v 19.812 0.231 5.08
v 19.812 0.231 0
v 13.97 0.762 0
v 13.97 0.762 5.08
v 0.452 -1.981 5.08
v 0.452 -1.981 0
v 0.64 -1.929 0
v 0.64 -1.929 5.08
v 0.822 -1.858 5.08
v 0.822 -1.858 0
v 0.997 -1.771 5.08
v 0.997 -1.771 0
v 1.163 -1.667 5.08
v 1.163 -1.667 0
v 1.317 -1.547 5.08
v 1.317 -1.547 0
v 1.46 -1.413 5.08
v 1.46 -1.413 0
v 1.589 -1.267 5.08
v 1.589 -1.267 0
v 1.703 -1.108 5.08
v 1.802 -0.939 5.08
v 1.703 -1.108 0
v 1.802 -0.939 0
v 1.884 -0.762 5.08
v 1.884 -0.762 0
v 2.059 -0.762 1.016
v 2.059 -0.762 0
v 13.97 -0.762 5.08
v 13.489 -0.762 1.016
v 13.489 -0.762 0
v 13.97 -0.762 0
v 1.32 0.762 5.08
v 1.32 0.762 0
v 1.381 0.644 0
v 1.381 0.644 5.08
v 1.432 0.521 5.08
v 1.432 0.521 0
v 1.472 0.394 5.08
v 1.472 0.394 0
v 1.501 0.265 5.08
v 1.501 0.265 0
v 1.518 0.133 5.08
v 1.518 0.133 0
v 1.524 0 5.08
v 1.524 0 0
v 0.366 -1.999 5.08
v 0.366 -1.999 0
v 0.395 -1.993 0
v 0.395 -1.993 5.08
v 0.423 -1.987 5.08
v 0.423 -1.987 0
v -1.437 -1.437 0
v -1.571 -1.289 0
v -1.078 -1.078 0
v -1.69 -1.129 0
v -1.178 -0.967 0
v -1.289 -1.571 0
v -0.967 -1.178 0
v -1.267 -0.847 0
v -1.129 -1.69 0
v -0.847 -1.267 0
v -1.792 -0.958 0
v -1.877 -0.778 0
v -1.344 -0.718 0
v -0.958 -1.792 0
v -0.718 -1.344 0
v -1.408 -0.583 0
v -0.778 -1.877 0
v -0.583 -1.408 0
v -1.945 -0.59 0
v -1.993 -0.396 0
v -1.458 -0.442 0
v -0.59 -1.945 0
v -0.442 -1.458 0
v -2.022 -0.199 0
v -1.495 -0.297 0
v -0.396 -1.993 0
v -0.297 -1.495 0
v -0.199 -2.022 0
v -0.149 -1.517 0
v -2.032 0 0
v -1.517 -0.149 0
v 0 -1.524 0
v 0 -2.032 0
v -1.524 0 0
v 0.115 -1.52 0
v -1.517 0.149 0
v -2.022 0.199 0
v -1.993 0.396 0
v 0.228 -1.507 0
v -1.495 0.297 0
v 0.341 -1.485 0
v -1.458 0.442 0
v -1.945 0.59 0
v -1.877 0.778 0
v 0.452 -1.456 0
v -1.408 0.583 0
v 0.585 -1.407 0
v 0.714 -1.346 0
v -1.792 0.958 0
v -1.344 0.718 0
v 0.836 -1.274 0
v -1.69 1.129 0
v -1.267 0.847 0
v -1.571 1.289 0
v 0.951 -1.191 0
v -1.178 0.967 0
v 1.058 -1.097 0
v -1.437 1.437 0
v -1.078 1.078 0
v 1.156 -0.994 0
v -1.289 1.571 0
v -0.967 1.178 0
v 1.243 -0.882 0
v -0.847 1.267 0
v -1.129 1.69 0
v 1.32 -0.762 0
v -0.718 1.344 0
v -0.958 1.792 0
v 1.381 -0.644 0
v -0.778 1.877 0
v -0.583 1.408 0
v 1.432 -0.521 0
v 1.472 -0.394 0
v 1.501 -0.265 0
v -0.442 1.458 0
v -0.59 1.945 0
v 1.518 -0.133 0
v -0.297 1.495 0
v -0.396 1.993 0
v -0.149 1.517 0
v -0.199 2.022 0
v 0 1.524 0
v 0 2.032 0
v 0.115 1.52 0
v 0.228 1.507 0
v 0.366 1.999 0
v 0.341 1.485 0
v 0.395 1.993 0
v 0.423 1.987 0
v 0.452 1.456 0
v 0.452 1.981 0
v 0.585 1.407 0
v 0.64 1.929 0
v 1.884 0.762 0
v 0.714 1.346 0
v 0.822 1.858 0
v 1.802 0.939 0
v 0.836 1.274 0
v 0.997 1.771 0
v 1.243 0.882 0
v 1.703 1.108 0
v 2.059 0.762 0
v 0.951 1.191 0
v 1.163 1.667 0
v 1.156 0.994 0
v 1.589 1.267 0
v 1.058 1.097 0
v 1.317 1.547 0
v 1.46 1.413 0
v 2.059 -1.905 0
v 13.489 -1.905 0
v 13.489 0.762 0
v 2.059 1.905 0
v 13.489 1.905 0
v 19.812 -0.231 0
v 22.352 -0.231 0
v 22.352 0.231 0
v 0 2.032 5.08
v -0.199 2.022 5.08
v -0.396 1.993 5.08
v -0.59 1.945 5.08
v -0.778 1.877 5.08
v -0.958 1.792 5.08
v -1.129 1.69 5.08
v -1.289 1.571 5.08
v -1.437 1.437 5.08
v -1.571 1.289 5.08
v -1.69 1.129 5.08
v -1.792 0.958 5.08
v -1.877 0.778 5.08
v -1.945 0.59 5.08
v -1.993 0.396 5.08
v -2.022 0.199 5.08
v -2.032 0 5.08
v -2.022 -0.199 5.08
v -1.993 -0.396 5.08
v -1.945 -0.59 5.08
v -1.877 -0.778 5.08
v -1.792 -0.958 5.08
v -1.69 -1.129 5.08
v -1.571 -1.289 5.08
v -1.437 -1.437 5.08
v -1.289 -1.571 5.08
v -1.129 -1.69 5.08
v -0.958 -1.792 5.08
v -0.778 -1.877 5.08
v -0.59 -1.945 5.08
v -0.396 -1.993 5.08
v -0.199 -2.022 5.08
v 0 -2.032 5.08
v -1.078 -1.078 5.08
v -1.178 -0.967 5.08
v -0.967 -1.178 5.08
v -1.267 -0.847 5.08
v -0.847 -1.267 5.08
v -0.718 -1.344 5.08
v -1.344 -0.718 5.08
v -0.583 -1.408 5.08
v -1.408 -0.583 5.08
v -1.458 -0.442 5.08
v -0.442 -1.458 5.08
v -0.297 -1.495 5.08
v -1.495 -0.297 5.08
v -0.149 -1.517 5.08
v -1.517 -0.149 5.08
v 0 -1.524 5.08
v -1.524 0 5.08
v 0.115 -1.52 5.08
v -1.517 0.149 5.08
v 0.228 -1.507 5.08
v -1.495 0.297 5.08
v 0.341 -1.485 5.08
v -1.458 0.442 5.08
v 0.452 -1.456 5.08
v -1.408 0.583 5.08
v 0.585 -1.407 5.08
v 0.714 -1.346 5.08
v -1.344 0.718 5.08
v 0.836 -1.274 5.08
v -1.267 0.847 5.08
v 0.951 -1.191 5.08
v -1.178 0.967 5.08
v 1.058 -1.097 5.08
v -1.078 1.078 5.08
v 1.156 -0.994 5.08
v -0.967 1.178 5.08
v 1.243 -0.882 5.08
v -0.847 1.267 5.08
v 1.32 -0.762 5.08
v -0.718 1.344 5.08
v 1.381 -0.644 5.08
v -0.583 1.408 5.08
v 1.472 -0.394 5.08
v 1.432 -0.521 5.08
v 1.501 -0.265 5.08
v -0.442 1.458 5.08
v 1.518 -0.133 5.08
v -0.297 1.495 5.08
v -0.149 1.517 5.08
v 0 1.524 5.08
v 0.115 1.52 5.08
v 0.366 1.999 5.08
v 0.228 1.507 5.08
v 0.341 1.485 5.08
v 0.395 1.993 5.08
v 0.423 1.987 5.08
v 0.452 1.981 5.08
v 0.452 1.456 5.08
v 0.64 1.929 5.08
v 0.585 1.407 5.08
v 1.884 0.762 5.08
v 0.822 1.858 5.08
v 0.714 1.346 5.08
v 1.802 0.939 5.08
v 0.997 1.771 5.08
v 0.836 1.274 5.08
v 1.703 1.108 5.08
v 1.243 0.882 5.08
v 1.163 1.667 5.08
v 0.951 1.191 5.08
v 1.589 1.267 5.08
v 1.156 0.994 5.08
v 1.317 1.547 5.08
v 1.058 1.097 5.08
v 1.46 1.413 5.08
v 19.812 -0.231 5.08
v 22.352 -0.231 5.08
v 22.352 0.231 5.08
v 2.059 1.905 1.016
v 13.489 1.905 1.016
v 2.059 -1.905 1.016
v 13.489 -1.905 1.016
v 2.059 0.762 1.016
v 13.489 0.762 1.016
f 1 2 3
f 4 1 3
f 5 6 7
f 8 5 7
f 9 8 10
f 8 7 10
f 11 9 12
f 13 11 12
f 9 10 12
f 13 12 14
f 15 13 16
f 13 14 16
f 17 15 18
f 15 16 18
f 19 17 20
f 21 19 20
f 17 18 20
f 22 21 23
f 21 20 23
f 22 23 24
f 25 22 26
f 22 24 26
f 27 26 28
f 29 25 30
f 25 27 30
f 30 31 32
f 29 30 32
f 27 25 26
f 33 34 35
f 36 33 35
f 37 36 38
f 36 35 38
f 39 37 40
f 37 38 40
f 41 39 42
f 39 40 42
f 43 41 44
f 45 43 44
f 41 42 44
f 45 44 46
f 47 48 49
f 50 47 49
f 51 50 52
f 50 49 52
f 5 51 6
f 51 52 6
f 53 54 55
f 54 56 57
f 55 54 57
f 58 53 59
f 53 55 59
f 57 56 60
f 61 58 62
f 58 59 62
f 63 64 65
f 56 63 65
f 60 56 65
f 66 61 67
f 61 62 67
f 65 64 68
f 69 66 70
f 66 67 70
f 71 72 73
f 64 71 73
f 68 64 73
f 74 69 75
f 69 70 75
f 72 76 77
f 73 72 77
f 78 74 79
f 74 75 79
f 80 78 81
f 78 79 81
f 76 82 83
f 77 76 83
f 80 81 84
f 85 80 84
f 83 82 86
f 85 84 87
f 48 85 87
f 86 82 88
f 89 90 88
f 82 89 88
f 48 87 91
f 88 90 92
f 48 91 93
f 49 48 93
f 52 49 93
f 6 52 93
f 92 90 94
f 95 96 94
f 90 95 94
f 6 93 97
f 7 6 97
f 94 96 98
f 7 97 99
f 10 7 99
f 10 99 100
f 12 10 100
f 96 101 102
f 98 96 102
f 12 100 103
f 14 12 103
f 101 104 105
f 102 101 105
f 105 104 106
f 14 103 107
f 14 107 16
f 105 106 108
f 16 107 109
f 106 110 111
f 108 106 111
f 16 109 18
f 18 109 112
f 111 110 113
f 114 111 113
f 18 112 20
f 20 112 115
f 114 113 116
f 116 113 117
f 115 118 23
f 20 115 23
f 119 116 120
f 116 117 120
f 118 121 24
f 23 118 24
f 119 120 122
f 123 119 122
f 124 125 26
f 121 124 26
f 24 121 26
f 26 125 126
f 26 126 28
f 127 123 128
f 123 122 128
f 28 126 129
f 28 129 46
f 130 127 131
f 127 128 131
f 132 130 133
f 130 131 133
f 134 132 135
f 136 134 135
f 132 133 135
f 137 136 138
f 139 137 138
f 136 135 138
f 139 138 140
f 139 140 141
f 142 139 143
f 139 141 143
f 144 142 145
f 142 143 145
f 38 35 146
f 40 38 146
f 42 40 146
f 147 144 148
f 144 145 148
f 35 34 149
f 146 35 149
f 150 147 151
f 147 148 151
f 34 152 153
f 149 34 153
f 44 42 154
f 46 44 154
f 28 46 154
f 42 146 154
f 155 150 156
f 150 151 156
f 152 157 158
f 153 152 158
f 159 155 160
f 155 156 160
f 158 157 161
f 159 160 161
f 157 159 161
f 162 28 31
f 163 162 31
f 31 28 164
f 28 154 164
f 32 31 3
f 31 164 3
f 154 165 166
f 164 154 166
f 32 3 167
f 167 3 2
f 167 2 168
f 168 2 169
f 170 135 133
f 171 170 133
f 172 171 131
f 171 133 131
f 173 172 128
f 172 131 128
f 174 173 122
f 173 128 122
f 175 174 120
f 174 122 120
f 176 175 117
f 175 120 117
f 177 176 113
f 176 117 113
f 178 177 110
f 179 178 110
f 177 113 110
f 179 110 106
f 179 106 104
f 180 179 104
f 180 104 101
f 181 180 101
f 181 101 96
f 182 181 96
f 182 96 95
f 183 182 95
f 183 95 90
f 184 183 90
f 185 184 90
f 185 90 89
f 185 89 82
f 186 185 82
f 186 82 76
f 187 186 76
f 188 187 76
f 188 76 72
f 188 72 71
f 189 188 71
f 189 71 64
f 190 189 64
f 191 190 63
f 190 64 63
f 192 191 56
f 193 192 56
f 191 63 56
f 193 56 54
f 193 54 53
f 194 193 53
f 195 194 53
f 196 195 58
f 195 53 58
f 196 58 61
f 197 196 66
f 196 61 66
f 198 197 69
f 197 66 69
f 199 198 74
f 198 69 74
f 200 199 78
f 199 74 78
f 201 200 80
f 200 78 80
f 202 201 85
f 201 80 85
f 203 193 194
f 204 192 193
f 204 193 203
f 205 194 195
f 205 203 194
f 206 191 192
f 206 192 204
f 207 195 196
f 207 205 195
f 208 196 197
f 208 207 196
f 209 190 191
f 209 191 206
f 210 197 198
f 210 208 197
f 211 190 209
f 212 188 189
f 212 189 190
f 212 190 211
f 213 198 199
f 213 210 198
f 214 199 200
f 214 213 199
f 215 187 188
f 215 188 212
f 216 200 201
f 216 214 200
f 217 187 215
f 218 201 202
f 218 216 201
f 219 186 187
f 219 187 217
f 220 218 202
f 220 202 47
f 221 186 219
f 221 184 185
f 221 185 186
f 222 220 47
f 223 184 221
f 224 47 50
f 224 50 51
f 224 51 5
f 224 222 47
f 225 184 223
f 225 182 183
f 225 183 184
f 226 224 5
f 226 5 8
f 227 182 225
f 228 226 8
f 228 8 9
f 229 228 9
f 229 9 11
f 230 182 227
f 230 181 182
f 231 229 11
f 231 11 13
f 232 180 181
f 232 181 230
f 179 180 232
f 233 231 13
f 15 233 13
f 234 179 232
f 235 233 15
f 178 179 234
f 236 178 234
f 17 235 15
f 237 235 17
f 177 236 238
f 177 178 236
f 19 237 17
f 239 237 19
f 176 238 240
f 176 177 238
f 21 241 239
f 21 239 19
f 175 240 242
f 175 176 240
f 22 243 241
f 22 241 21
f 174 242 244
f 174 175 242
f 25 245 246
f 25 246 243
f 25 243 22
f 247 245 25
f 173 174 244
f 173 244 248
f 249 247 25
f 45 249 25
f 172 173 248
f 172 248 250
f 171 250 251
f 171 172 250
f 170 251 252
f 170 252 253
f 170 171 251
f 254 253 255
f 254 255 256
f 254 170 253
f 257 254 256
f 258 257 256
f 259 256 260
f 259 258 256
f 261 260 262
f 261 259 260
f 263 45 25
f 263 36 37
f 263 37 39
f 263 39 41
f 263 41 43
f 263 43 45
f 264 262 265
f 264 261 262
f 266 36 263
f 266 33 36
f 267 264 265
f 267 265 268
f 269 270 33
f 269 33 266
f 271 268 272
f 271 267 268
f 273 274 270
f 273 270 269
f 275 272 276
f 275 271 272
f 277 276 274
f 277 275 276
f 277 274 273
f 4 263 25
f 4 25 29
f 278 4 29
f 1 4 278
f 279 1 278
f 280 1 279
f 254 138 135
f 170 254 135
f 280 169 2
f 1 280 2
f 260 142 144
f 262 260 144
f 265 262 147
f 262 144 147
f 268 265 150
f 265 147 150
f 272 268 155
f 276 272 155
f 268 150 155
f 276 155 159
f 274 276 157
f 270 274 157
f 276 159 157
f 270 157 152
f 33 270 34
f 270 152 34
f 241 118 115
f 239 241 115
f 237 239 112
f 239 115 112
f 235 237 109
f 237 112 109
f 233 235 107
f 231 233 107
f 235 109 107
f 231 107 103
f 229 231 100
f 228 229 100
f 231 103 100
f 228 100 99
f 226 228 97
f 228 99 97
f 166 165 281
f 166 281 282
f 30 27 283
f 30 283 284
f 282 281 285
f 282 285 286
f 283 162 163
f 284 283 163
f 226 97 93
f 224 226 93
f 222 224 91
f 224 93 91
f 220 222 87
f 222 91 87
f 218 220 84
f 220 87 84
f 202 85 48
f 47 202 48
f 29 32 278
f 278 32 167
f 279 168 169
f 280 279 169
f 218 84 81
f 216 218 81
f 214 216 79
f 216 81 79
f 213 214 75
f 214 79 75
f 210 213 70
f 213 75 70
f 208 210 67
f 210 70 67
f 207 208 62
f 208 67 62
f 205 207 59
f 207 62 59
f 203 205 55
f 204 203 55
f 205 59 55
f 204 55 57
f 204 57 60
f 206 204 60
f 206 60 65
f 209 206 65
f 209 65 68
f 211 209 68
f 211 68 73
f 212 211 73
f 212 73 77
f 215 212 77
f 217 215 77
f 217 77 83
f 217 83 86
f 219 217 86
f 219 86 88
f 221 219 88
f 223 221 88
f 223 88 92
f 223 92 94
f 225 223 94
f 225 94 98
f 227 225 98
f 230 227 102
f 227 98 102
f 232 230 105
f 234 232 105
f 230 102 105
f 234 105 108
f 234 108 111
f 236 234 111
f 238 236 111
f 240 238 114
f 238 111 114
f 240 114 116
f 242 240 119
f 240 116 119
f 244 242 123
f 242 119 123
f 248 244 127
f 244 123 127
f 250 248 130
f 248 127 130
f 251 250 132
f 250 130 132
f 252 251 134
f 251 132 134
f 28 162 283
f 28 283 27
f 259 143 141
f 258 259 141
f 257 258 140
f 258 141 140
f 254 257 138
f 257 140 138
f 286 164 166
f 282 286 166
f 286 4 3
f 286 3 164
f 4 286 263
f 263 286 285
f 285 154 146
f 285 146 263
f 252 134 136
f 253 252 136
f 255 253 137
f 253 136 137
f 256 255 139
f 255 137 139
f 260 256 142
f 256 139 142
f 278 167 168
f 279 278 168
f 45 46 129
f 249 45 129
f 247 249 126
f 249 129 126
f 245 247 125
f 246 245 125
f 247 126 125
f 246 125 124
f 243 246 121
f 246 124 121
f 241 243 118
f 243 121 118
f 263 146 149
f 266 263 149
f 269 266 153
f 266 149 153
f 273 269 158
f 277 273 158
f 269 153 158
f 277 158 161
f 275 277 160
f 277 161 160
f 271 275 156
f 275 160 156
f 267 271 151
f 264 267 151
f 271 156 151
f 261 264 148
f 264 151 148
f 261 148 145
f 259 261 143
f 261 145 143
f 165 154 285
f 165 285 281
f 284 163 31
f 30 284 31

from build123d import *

# Parameters (mm, degrees)
F1_DEPTH = 5.08
F2_DEPTH = 5.0292
F3_W     = 11.43
F3_H     = 3.81
F4_DEPTH = 1.016


with BuildPart() as f1:
    # F0 (on Top) → F1 (new body)
    with BuildSketch(Plane.XY):
        with BuildLine():
            ThreePointArc((1.524, 0), (1.4720709593, -0.3944402247), (1.3198227154, -0.762))
            Line((1.3198227154, -0.762), (1.8837144157, -0.762))
            ThreePointArc((1.8837144157, -0.762), (1.9945841287, -0.3881470773), (2.032, 0))
            Line((2.032, 0), (1.524, 0))
        make_face()
        with BuildLine():
            Line((1.8837144157, 0.762), (1.3198227154, 0.762))
            ThreePointArc((1.3198227154, 0.762), (1.4720709593, 0.3944402247), (1.524, 0))
            Line((1.524, 0), (2.032, 0))
            ThreePointArc((2.032, 0), (1.9945841287, 0.3881470773), (1.8837144157, 0.762))
        make_face()
        Polygon((19.812, 0.2309090909), (13.97, 0.762), (13.97, 0), (19.812, 0), align=None)
        Polygon((13.97, 0), (13.97, -0.762), (19.812, -0.2309090909), (19.812, 0), align=None)
        Polygon((22.352, 0), (19.812, 0.2309090909), (19.812, 0), align=None)
        Polygon((19.812, 0), (19.812, -0.2309090909), (22.352, 0), align=None)
        with BuildLine():
            ThreePointArc((0, -1.524), (-1.524, 0), (0, 1.524))
            Line((0, 1.524), (0, 2.032))
            ThreePointArc((0, 2.032), (-2.032, 0), (0, -2.032))
            Line((0, -2.032), (0, -1.524))
        make_face()
        with BuildLine():
            ThreePointArc((0.4517456439, -1.4555074281), (0.2284542401, -1.5067795659), (0, -1.524))
            Line((0, -1.524), (0, -2.032))
            Line((0, -2.032), (0.3664262295, -1.9986885246))
            ThreePointArc((0.3664262295, -1.9986885246), (0.4091799306, -1.9903757897), (0.4517456439, -1.9811486247))
            Line((0.4517456439, -1.9811486247), (0.4517456439, -1.4555074281))
        make_face()
        with BuildLine():
            Line((0, 2.032), (0, 1.524))
            ThreePointArc((0, 1.524), (0.2284542401, 1.5067795659), (0.4517456439, 1.4555074281))
            Line((0.4517456439, 1.4555074281), (0.4517456439, 1.9811486247))
            ThreePointArc((0.4517456439, 1.9811486247), (0.4091799306, 1.9903757897), (0.3664262295, 1.9986885246))
            Line((0.3664262295, 1.9986885246), (0, 2.032))
        make_face()
        with BuildLine():
            Line((0.4517456439, 1.9811486247), (0.4517456439, 1.4555074281))
            ThreePointArc((0.4517456439, 1.4555074281), (0.9512369584, 1.1906822619), (1.3198227154, 0.762))
            Line((1.3198227154, 0.762), (1.8837144157, 0.762))
            ThreePointArc((1.8837144157, 0.762), (1.3172601356, 1.5472070757), (0.4517456439, 1.9811486247))
        make_face()
        with BuildLine():
            ThreePointArc((1.3198227154, -0.762), (0.9512369584, -1.1906822619), (0.4517456439, -1.4555074281))
            Line((0.4517456439, -1.4555074281), (0.4517456439, -1.9811486247))
            ThreePointArc((0.4517456439, -1.9811486247), (1.3172601356, -1.5472070757), (1.8837144157, -0.762))
            Line((1.8837144157, -0.762), (1.3198227154, -0.762))
        make_face()
        with BuildLine():
            Line((13.97, 0.762), (1.8837144157, 0.762))
            ThreePointArc((1.8837144157, 0.762), (1.9945841287, 0.3881470773), (2.032, 0))
            Line((2.032, 0), (13.97, 0))
            Line((13.97, 0), (13.97, 0.762))
        make_face()
        with BuildLine():
            ThreePointArc((2.032, 0), (1.9945841287, -0.3881470773), (1.8837144157, -0.762))
            Line((1.8837144157, -0.762), (13.97, -0.762))
            Line((13.97, -0.762), (13.97, 0))
            Line((13.97, 0), (2.032, 0))
        make_face()
        Polygon((22.352, 0.2309090909), (19.812, 0.2309090909), (22.352, 0), align=None)
        Polygon((22.352, 0), (19.812, -0.2309090909), (22.352, -0.2309090909), align=None)
    extrude(amount=F1_DEPTH)

    # F0 (on Top) → F2 (join)
    with BuildSketch(Plane.XY):
        with BuildLine():
            ThreePointArc((1.524, 0), (1.4720709593, -0.3944402247), (1.3198227154, -0.762))
            Line((1.3198227154, -0.762), (1.8837144157, -0.762))
            ThreePointArc((1.8837144157, -0.762), (1.9945841287, -0.3881470773), (2.032, 0))
            Line((2.032, 0), (1.524, 0))
        make_face()
        with BuildLine():
            Line((0, 2.032), (0, 1.524))
            ThreePointArc((0, 1.524), (0.2284542401, 1.5067795659), (0.4517456439, 1.4555074281))
            Line((0.4517456439, 1.4555074281), (0.4517456439, 1.9811486247))
            ThreePointArc((0.4517456439, 1.9811486247), (0.4091799306, 1.9903757897), (0.3664262295, 1.9986885246))
            Line((0.3664262295, 1.9986885246), (0, 2.032))
        make_face()
        with BuildLine():
            ThreePointArc((0, -1.524), (-1.524, 0), (0, 1.524))
            Line((0, 1.524), (0, 2.032))
            ThreePointArc((0, 2.032), (-2.032, 0), (0, -2.032))
            Line((0, -2.032), (0, -1.524))
        make_face()
    extrude(amount=F2_DEPTH)

    # F3 (on Top) → F4 (join)
    with BuildSketch(Plane.XY):
        with Locations((7.7741611749, 0)):
            Rectangle(F3_W, F3_H)
    extrude(amount=F4_DEPTH)


solid = f1.part
